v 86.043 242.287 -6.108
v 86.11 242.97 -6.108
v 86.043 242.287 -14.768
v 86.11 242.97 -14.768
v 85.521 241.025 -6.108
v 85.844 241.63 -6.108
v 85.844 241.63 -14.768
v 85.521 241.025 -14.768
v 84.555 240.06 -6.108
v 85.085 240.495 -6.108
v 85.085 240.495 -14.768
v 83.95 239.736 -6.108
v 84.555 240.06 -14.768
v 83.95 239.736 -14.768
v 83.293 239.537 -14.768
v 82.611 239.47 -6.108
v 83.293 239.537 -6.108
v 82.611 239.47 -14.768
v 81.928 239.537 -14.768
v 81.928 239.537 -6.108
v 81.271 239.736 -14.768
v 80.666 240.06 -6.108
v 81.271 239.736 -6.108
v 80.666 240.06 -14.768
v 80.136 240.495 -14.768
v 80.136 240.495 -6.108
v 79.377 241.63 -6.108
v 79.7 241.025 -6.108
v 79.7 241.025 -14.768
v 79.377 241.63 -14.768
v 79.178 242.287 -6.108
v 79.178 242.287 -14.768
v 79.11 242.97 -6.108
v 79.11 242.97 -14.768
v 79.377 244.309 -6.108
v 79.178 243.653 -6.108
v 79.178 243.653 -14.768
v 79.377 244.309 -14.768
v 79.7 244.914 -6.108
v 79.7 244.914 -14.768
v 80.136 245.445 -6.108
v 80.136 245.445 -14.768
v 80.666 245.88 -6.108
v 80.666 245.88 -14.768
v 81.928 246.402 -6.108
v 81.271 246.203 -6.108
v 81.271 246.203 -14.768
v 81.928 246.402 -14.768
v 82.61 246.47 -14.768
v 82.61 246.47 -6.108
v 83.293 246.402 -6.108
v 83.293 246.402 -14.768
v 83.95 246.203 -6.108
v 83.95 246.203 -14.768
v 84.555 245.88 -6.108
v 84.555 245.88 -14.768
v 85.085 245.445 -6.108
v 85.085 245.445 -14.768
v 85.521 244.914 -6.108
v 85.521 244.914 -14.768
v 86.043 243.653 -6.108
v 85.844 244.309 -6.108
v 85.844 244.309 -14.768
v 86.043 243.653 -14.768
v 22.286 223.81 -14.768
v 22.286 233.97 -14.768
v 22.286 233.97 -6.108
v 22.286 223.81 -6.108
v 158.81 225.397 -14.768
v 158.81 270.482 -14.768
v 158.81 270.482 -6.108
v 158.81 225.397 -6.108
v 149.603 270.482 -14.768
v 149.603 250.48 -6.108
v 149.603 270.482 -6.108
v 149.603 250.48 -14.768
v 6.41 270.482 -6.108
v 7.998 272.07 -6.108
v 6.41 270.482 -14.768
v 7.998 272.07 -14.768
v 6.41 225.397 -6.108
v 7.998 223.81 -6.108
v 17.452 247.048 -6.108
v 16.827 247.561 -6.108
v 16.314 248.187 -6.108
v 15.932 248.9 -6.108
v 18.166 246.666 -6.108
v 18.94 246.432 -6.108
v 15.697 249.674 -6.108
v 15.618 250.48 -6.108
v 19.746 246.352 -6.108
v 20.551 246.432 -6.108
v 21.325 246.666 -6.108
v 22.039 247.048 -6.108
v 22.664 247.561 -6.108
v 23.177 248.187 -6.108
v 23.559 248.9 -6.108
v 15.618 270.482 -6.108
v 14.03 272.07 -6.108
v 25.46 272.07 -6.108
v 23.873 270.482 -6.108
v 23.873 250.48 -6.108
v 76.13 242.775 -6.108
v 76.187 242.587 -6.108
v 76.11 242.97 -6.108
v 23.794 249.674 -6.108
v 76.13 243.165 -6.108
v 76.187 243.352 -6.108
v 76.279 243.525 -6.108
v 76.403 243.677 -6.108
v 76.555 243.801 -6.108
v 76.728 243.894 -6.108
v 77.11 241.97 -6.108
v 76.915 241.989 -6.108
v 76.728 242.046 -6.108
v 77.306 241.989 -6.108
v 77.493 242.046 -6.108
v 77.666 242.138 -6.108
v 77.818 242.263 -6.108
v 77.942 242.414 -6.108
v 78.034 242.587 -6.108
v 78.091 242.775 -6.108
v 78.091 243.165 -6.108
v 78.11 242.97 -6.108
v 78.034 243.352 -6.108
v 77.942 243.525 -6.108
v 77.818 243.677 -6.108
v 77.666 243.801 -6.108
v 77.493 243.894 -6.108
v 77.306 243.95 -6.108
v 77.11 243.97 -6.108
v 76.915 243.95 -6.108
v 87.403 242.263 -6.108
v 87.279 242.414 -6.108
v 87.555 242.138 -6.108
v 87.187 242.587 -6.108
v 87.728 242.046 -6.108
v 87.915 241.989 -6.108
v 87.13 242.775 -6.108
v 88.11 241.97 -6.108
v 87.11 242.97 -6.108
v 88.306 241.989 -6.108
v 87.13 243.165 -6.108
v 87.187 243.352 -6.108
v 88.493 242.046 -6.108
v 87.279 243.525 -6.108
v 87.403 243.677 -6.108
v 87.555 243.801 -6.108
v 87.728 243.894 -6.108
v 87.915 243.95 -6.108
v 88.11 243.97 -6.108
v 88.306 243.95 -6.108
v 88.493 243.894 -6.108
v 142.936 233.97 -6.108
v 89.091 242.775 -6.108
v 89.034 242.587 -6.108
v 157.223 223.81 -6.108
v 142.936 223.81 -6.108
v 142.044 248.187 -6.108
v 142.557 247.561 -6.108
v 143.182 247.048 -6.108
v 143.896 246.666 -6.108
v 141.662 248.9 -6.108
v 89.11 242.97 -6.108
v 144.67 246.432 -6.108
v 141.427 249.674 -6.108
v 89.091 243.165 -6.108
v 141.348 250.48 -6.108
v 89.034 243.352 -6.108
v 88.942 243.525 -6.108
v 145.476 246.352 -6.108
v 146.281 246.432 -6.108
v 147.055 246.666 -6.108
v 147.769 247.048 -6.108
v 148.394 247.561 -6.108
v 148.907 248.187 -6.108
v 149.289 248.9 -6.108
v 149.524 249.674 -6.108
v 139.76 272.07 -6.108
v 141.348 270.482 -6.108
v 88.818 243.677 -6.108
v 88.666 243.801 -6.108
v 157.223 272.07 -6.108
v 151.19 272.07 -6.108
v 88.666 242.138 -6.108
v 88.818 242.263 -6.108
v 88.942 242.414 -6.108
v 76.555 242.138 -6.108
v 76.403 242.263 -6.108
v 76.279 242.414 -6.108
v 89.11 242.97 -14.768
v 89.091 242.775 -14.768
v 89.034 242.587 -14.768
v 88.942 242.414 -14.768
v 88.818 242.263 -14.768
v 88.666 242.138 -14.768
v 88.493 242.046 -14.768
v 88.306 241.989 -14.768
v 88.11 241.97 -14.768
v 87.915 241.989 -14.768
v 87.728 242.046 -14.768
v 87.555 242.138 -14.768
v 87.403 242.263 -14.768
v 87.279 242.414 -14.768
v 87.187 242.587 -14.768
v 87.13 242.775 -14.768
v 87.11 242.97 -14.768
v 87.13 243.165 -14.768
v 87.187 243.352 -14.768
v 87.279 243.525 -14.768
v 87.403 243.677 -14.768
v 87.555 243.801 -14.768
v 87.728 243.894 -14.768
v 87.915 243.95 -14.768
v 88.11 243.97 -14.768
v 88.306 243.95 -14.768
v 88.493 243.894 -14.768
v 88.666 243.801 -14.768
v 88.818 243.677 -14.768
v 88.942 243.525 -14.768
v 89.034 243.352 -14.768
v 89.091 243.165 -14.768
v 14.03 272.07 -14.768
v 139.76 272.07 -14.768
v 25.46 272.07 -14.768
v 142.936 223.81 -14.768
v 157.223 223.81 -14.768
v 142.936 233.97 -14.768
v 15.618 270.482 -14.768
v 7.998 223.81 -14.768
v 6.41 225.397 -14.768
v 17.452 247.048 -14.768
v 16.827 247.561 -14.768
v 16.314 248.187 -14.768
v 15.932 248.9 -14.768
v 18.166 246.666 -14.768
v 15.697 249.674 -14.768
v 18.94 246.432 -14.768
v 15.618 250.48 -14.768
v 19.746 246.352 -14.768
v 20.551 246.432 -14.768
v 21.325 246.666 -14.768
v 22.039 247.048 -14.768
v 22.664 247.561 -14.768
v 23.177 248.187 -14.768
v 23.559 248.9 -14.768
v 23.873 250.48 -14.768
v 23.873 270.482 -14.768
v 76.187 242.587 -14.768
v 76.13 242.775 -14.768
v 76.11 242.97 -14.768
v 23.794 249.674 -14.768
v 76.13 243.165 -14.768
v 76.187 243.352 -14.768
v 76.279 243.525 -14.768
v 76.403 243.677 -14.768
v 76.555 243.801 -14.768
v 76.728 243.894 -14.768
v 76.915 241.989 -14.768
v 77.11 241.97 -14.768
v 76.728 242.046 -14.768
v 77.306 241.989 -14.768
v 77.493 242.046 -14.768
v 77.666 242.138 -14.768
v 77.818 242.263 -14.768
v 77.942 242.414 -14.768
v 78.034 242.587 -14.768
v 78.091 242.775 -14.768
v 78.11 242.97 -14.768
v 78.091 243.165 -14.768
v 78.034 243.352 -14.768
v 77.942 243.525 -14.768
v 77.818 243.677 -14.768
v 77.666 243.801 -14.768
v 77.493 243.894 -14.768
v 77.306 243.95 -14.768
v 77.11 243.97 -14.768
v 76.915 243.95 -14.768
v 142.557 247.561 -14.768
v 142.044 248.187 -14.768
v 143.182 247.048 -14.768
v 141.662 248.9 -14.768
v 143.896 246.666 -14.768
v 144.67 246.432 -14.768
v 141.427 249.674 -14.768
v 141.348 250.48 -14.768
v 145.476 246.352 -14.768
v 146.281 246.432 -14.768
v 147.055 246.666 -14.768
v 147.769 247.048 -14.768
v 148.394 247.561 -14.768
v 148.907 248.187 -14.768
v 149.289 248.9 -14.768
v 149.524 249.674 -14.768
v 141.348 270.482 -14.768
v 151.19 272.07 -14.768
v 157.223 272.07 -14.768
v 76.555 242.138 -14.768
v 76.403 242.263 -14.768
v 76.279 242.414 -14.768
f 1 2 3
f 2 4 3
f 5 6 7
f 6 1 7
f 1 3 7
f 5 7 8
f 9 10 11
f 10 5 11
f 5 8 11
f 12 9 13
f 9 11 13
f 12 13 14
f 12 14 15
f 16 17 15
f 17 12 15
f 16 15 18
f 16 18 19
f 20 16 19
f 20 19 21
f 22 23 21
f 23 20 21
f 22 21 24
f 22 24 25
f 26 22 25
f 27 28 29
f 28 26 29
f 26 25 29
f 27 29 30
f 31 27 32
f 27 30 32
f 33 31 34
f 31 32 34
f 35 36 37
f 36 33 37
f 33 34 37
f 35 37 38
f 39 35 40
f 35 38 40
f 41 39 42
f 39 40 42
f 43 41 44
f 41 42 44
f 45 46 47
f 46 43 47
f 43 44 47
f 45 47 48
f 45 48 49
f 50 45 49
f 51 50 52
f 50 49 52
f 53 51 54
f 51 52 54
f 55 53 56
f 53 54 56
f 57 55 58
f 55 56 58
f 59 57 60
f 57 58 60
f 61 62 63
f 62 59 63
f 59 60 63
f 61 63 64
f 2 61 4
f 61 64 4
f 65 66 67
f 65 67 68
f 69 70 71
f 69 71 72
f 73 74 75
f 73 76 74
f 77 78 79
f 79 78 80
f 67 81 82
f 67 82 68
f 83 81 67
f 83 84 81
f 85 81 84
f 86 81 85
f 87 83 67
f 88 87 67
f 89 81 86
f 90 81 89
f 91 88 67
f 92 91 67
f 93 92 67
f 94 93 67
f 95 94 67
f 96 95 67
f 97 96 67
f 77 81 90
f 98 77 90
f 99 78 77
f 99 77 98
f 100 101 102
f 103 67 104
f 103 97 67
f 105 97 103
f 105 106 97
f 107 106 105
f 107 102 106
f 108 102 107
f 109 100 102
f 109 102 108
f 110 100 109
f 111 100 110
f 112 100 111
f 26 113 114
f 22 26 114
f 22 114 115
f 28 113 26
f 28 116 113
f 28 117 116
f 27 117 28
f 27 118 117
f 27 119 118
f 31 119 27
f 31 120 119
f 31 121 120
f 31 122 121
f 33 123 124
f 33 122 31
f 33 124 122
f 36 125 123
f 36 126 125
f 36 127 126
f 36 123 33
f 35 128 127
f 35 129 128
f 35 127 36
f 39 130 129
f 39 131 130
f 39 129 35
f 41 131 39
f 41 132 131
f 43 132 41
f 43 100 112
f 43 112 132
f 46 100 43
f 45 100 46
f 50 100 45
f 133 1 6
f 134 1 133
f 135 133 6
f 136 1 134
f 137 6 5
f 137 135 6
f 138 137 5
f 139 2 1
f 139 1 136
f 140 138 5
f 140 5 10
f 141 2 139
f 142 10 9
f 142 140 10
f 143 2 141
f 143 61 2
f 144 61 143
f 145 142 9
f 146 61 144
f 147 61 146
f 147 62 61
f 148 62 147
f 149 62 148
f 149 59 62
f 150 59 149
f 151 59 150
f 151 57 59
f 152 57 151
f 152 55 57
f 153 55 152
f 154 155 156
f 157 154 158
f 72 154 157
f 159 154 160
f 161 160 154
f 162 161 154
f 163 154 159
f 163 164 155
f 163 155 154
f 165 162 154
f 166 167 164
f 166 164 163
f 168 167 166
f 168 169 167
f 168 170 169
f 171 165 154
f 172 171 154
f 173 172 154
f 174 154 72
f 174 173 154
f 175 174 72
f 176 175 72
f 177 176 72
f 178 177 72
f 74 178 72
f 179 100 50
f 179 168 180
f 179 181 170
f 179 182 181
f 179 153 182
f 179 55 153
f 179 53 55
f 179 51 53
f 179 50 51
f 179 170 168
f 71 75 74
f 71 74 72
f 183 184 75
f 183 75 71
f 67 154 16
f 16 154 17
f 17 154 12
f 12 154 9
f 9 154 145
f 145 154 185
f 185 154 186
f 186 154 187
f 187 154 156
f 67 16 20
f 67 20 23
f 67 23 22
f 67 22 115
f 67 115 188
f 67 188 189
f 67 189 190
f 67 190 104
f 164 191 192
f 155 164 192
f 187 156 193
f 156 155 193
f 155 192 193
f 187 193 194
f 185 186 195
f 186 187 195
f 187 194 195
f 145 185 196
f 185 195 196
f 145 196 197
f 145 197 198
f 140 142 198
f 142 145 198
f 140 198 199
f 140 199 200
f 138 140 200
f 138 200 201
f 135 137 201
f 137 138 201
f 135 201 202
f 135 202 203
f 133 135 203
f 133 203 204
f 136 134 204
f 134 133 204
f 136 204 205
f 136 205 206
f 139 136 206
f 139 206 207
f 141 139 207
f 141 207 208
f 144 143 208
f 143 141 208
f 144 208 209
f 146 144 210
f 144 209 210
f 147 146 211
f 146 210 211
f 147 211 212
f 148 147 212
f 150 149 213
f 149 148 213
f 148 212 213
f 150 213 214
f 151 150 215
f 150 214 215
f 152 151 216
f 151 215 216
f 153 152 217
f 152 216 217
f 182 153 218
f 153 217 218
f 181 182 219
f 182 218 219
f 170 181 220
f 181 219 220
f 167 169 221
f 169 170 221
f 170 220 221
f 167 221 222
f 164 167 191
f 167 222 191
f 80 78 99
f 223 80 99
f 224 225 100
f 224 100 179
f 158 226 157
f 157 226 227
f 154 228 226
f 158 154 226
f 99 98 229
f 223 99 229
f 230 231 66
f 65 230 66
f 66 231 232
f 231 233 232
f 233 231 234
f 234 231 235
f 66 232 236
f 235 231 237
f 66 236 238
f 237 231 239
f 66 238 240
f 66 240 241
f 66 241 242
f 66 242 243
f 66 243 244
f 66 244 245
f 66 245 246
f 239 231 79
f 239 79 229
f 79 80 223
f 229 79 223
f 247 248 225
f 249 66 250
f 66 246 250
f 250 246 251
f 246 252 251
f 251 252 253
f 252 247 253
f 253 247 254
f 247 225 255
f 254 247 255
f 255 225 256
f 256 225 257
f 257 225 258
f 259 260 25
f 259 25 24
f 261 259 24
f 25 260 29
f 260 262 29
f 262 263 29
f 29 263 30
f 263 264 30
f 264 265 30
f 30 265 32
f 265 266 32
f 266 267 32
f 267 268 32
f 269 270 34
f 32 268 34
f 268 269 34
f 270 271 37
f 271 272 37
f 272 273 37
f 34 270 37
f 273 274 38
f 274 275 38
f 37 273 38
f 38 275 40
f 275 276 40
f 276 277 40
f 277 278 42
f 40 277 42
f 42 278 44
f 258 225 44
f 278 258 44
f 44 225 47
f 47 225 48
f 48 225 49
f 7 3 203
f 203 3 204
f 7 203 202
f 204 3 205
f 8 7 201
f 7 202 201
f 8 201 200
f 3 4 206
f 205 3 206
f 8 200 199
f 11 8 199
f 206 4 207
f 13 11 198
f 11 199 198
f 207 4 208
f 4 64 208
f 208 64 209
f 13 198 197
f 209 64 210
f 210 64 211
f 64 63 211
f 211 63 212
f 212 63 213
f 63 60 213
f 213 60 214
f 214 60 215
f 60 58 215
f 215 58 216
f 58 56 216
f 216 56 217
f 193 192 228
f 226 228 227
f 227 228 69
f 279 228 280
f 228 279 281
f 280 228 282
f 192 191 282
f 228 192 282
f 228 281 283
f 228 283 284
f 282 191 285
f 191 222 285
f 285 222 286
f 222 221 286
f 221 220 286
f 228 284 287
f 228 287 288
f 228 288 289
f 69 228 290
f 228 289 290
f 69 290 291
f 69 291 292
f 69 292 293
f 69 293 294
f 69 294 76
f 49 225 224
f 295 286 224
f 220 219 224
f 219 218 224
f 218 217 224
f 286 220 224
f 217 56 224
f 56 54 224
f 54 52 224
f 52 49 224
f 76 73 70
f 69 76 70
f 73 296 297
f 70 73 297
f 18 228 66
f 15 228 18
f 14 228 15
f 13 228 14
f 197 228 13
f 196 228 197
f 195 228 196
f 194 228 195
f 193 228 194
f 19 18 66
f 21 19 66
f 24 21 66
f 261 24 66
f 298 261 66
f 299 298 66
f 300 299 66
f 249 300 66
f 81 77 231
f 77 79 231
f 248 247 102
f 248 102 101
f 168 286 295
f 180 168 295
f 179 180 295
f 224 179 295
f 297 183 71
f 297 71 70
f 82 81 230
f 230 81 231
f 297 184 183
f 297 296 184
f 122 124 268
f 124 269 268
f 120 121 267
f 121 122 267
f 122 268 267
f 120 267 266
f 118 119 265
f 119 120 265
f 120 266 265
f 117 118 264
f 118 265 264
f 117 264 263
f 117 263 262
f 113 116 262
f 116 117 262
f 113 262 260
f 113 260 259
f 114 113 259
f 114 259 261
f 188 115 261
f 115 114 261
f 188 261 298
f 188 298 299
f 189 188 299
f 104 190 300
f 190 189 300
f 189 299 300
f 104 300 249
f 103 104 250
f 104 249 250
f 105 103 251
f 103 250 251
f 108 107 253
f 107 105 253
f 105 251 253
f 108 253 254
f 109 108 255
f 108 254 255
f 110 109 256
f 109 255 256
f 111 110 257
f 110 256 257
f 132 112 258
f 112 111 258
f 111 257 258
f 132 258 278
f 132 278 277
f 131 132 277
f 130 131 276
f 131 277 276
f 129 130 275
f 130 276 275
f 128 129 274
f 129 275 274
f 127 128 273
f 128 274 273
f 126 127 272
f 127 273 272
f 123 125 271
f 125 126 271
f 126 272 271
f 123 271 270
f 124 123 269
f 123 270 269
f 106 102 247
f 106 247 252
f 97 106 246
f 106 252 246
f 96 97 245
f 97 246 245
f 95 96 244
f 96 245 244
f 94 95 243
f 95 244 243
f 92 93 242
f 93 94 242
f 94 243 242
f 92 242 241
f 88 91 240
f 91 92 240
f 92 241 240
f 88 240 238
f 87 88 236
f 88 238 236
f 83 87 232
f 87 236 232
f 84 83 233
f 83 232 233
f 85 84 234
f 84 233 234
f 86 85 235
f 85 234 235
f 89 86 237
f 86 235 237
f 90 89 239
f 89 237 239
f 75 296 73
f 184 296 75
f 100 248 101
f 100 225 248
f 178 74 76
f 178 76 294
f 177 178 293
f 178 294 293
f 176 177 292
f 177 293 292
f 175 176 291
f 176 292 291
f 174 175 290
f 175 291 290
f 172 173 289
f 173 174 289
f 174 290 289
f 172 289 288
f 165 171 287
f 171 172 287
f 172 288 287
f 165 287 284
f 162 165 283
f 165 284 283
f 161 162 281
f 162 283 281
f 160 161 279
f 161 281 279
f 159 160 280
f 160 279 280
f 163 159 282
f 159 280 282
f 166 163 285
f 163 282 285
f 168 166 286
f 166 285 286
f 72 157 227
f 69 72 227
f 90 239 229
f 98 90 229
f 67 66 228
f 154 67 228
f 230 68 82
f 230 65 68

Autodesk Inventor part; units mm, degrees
ref_plane "YZ Plane" through (0, 0, 0) normal (1, 0, 0) x (0, 1, 0)
ref_plane "XZ Plane" through (0, 0, 0) normal (0, 1, 0) x (-1, 0, 0)
ref_plane "XY Plane" through (0, 0, 0) normal (0, 0, 1) x (1, 0, 0)
ref_plane "Work Plane1" through (82.6105, 192.6947, -14.7678) normal (0, 0, 1) x (1, 0, 0)
sketch "Sketch1" plane through (82.6105, 192.6947, -14.7678) normal (0, 0, 1) x (1, 0, 0)
  line L0 (76.2, 79.375) -> (76.2, 31.115)
  arc A0 (-66.9925, 57.785) -> (-58.7375, 57.785) centre (-62.865, 57.785) ccw
  line L1 (-66.9925, 57.785) -> (-66.9925, 79.375)
  line L2 (-58.7375, 57.785) -> (-58.7375, 79.375)
  line L3 (-76.2, 79.375) -> (-66.9925, 79.375)
  line L4 (0, 79.375) -> (0, 48.4751) construction
  line L5 (58.7375, 57.785) -> (58.7375, 79.375)
  line L6 (66.9925, 57.785) -> (66.9925, 79.375)
  arc A1 (58.7375, 57.785) -> (66.9925, 57.785) centre (62.865, 57.785) ccw
  line L7 (-58.7375, 79.375) -> (58.7375, 79.375)
  line L8 (66.9925, 79.375) -> (76.2, 79.375)
  line L9 (-60.325, 41.275) -> (-60.325, 31.115)
  line L10 (-60.325, 41.275) -> (60.325, 41.275)
  line L11 (60.325, 41.275) -> (60.325, 31.115)
  line L12 (-76.2, 79.375) -> (-76.2, 31.115)
  circle A2 centre (0, 50.275) radius 3.5
  circle A3 centre (5.5, 50.275) radius 1
  circle A4 centre (-5.5, 50.275) radius 1
  line L13 (-60.325, 31.115) -> (-76.2, 31.115)
  line L14 (60.325, 31.115) -> (76.2, 31.115)
  point P0 (-82.6105, -192.6947)
  point P1 (0, 0)
  dimension "d1" = 76.2
  dimension "d4" = 8.255
  dimension "d10" = 152.4
  dimension "d11" = 7
  dimension "d12" = 9
  dimension "d13" = 2
  dimension "d14" = 5.5
  dimension "d15" = 2
  dimension "d16" = 5.5
  dimension "d17" = 57.785
extrude "Extrusion1" add sketch "Sketch1" along normal blind 8.66
chamfer "Chamfer1" distance 1.5875 angle 45 8 edges at (158.8105, 223.8097, -10.4378) (141.348, 272.0697, -10.4378) (158.8105, 272.0697, -10.4378) (6.4105, 223.8097, -10.4378) (6.4105, 272.0697, -10.4378) (15.618, 272.0697, -10.4378) (23.873, 272.0697, -10.4378) (149.603, 272.0697, -10.4378)
equation "\"d1\" = 0.5 * d10"
properties part number "Lower Bracket"
